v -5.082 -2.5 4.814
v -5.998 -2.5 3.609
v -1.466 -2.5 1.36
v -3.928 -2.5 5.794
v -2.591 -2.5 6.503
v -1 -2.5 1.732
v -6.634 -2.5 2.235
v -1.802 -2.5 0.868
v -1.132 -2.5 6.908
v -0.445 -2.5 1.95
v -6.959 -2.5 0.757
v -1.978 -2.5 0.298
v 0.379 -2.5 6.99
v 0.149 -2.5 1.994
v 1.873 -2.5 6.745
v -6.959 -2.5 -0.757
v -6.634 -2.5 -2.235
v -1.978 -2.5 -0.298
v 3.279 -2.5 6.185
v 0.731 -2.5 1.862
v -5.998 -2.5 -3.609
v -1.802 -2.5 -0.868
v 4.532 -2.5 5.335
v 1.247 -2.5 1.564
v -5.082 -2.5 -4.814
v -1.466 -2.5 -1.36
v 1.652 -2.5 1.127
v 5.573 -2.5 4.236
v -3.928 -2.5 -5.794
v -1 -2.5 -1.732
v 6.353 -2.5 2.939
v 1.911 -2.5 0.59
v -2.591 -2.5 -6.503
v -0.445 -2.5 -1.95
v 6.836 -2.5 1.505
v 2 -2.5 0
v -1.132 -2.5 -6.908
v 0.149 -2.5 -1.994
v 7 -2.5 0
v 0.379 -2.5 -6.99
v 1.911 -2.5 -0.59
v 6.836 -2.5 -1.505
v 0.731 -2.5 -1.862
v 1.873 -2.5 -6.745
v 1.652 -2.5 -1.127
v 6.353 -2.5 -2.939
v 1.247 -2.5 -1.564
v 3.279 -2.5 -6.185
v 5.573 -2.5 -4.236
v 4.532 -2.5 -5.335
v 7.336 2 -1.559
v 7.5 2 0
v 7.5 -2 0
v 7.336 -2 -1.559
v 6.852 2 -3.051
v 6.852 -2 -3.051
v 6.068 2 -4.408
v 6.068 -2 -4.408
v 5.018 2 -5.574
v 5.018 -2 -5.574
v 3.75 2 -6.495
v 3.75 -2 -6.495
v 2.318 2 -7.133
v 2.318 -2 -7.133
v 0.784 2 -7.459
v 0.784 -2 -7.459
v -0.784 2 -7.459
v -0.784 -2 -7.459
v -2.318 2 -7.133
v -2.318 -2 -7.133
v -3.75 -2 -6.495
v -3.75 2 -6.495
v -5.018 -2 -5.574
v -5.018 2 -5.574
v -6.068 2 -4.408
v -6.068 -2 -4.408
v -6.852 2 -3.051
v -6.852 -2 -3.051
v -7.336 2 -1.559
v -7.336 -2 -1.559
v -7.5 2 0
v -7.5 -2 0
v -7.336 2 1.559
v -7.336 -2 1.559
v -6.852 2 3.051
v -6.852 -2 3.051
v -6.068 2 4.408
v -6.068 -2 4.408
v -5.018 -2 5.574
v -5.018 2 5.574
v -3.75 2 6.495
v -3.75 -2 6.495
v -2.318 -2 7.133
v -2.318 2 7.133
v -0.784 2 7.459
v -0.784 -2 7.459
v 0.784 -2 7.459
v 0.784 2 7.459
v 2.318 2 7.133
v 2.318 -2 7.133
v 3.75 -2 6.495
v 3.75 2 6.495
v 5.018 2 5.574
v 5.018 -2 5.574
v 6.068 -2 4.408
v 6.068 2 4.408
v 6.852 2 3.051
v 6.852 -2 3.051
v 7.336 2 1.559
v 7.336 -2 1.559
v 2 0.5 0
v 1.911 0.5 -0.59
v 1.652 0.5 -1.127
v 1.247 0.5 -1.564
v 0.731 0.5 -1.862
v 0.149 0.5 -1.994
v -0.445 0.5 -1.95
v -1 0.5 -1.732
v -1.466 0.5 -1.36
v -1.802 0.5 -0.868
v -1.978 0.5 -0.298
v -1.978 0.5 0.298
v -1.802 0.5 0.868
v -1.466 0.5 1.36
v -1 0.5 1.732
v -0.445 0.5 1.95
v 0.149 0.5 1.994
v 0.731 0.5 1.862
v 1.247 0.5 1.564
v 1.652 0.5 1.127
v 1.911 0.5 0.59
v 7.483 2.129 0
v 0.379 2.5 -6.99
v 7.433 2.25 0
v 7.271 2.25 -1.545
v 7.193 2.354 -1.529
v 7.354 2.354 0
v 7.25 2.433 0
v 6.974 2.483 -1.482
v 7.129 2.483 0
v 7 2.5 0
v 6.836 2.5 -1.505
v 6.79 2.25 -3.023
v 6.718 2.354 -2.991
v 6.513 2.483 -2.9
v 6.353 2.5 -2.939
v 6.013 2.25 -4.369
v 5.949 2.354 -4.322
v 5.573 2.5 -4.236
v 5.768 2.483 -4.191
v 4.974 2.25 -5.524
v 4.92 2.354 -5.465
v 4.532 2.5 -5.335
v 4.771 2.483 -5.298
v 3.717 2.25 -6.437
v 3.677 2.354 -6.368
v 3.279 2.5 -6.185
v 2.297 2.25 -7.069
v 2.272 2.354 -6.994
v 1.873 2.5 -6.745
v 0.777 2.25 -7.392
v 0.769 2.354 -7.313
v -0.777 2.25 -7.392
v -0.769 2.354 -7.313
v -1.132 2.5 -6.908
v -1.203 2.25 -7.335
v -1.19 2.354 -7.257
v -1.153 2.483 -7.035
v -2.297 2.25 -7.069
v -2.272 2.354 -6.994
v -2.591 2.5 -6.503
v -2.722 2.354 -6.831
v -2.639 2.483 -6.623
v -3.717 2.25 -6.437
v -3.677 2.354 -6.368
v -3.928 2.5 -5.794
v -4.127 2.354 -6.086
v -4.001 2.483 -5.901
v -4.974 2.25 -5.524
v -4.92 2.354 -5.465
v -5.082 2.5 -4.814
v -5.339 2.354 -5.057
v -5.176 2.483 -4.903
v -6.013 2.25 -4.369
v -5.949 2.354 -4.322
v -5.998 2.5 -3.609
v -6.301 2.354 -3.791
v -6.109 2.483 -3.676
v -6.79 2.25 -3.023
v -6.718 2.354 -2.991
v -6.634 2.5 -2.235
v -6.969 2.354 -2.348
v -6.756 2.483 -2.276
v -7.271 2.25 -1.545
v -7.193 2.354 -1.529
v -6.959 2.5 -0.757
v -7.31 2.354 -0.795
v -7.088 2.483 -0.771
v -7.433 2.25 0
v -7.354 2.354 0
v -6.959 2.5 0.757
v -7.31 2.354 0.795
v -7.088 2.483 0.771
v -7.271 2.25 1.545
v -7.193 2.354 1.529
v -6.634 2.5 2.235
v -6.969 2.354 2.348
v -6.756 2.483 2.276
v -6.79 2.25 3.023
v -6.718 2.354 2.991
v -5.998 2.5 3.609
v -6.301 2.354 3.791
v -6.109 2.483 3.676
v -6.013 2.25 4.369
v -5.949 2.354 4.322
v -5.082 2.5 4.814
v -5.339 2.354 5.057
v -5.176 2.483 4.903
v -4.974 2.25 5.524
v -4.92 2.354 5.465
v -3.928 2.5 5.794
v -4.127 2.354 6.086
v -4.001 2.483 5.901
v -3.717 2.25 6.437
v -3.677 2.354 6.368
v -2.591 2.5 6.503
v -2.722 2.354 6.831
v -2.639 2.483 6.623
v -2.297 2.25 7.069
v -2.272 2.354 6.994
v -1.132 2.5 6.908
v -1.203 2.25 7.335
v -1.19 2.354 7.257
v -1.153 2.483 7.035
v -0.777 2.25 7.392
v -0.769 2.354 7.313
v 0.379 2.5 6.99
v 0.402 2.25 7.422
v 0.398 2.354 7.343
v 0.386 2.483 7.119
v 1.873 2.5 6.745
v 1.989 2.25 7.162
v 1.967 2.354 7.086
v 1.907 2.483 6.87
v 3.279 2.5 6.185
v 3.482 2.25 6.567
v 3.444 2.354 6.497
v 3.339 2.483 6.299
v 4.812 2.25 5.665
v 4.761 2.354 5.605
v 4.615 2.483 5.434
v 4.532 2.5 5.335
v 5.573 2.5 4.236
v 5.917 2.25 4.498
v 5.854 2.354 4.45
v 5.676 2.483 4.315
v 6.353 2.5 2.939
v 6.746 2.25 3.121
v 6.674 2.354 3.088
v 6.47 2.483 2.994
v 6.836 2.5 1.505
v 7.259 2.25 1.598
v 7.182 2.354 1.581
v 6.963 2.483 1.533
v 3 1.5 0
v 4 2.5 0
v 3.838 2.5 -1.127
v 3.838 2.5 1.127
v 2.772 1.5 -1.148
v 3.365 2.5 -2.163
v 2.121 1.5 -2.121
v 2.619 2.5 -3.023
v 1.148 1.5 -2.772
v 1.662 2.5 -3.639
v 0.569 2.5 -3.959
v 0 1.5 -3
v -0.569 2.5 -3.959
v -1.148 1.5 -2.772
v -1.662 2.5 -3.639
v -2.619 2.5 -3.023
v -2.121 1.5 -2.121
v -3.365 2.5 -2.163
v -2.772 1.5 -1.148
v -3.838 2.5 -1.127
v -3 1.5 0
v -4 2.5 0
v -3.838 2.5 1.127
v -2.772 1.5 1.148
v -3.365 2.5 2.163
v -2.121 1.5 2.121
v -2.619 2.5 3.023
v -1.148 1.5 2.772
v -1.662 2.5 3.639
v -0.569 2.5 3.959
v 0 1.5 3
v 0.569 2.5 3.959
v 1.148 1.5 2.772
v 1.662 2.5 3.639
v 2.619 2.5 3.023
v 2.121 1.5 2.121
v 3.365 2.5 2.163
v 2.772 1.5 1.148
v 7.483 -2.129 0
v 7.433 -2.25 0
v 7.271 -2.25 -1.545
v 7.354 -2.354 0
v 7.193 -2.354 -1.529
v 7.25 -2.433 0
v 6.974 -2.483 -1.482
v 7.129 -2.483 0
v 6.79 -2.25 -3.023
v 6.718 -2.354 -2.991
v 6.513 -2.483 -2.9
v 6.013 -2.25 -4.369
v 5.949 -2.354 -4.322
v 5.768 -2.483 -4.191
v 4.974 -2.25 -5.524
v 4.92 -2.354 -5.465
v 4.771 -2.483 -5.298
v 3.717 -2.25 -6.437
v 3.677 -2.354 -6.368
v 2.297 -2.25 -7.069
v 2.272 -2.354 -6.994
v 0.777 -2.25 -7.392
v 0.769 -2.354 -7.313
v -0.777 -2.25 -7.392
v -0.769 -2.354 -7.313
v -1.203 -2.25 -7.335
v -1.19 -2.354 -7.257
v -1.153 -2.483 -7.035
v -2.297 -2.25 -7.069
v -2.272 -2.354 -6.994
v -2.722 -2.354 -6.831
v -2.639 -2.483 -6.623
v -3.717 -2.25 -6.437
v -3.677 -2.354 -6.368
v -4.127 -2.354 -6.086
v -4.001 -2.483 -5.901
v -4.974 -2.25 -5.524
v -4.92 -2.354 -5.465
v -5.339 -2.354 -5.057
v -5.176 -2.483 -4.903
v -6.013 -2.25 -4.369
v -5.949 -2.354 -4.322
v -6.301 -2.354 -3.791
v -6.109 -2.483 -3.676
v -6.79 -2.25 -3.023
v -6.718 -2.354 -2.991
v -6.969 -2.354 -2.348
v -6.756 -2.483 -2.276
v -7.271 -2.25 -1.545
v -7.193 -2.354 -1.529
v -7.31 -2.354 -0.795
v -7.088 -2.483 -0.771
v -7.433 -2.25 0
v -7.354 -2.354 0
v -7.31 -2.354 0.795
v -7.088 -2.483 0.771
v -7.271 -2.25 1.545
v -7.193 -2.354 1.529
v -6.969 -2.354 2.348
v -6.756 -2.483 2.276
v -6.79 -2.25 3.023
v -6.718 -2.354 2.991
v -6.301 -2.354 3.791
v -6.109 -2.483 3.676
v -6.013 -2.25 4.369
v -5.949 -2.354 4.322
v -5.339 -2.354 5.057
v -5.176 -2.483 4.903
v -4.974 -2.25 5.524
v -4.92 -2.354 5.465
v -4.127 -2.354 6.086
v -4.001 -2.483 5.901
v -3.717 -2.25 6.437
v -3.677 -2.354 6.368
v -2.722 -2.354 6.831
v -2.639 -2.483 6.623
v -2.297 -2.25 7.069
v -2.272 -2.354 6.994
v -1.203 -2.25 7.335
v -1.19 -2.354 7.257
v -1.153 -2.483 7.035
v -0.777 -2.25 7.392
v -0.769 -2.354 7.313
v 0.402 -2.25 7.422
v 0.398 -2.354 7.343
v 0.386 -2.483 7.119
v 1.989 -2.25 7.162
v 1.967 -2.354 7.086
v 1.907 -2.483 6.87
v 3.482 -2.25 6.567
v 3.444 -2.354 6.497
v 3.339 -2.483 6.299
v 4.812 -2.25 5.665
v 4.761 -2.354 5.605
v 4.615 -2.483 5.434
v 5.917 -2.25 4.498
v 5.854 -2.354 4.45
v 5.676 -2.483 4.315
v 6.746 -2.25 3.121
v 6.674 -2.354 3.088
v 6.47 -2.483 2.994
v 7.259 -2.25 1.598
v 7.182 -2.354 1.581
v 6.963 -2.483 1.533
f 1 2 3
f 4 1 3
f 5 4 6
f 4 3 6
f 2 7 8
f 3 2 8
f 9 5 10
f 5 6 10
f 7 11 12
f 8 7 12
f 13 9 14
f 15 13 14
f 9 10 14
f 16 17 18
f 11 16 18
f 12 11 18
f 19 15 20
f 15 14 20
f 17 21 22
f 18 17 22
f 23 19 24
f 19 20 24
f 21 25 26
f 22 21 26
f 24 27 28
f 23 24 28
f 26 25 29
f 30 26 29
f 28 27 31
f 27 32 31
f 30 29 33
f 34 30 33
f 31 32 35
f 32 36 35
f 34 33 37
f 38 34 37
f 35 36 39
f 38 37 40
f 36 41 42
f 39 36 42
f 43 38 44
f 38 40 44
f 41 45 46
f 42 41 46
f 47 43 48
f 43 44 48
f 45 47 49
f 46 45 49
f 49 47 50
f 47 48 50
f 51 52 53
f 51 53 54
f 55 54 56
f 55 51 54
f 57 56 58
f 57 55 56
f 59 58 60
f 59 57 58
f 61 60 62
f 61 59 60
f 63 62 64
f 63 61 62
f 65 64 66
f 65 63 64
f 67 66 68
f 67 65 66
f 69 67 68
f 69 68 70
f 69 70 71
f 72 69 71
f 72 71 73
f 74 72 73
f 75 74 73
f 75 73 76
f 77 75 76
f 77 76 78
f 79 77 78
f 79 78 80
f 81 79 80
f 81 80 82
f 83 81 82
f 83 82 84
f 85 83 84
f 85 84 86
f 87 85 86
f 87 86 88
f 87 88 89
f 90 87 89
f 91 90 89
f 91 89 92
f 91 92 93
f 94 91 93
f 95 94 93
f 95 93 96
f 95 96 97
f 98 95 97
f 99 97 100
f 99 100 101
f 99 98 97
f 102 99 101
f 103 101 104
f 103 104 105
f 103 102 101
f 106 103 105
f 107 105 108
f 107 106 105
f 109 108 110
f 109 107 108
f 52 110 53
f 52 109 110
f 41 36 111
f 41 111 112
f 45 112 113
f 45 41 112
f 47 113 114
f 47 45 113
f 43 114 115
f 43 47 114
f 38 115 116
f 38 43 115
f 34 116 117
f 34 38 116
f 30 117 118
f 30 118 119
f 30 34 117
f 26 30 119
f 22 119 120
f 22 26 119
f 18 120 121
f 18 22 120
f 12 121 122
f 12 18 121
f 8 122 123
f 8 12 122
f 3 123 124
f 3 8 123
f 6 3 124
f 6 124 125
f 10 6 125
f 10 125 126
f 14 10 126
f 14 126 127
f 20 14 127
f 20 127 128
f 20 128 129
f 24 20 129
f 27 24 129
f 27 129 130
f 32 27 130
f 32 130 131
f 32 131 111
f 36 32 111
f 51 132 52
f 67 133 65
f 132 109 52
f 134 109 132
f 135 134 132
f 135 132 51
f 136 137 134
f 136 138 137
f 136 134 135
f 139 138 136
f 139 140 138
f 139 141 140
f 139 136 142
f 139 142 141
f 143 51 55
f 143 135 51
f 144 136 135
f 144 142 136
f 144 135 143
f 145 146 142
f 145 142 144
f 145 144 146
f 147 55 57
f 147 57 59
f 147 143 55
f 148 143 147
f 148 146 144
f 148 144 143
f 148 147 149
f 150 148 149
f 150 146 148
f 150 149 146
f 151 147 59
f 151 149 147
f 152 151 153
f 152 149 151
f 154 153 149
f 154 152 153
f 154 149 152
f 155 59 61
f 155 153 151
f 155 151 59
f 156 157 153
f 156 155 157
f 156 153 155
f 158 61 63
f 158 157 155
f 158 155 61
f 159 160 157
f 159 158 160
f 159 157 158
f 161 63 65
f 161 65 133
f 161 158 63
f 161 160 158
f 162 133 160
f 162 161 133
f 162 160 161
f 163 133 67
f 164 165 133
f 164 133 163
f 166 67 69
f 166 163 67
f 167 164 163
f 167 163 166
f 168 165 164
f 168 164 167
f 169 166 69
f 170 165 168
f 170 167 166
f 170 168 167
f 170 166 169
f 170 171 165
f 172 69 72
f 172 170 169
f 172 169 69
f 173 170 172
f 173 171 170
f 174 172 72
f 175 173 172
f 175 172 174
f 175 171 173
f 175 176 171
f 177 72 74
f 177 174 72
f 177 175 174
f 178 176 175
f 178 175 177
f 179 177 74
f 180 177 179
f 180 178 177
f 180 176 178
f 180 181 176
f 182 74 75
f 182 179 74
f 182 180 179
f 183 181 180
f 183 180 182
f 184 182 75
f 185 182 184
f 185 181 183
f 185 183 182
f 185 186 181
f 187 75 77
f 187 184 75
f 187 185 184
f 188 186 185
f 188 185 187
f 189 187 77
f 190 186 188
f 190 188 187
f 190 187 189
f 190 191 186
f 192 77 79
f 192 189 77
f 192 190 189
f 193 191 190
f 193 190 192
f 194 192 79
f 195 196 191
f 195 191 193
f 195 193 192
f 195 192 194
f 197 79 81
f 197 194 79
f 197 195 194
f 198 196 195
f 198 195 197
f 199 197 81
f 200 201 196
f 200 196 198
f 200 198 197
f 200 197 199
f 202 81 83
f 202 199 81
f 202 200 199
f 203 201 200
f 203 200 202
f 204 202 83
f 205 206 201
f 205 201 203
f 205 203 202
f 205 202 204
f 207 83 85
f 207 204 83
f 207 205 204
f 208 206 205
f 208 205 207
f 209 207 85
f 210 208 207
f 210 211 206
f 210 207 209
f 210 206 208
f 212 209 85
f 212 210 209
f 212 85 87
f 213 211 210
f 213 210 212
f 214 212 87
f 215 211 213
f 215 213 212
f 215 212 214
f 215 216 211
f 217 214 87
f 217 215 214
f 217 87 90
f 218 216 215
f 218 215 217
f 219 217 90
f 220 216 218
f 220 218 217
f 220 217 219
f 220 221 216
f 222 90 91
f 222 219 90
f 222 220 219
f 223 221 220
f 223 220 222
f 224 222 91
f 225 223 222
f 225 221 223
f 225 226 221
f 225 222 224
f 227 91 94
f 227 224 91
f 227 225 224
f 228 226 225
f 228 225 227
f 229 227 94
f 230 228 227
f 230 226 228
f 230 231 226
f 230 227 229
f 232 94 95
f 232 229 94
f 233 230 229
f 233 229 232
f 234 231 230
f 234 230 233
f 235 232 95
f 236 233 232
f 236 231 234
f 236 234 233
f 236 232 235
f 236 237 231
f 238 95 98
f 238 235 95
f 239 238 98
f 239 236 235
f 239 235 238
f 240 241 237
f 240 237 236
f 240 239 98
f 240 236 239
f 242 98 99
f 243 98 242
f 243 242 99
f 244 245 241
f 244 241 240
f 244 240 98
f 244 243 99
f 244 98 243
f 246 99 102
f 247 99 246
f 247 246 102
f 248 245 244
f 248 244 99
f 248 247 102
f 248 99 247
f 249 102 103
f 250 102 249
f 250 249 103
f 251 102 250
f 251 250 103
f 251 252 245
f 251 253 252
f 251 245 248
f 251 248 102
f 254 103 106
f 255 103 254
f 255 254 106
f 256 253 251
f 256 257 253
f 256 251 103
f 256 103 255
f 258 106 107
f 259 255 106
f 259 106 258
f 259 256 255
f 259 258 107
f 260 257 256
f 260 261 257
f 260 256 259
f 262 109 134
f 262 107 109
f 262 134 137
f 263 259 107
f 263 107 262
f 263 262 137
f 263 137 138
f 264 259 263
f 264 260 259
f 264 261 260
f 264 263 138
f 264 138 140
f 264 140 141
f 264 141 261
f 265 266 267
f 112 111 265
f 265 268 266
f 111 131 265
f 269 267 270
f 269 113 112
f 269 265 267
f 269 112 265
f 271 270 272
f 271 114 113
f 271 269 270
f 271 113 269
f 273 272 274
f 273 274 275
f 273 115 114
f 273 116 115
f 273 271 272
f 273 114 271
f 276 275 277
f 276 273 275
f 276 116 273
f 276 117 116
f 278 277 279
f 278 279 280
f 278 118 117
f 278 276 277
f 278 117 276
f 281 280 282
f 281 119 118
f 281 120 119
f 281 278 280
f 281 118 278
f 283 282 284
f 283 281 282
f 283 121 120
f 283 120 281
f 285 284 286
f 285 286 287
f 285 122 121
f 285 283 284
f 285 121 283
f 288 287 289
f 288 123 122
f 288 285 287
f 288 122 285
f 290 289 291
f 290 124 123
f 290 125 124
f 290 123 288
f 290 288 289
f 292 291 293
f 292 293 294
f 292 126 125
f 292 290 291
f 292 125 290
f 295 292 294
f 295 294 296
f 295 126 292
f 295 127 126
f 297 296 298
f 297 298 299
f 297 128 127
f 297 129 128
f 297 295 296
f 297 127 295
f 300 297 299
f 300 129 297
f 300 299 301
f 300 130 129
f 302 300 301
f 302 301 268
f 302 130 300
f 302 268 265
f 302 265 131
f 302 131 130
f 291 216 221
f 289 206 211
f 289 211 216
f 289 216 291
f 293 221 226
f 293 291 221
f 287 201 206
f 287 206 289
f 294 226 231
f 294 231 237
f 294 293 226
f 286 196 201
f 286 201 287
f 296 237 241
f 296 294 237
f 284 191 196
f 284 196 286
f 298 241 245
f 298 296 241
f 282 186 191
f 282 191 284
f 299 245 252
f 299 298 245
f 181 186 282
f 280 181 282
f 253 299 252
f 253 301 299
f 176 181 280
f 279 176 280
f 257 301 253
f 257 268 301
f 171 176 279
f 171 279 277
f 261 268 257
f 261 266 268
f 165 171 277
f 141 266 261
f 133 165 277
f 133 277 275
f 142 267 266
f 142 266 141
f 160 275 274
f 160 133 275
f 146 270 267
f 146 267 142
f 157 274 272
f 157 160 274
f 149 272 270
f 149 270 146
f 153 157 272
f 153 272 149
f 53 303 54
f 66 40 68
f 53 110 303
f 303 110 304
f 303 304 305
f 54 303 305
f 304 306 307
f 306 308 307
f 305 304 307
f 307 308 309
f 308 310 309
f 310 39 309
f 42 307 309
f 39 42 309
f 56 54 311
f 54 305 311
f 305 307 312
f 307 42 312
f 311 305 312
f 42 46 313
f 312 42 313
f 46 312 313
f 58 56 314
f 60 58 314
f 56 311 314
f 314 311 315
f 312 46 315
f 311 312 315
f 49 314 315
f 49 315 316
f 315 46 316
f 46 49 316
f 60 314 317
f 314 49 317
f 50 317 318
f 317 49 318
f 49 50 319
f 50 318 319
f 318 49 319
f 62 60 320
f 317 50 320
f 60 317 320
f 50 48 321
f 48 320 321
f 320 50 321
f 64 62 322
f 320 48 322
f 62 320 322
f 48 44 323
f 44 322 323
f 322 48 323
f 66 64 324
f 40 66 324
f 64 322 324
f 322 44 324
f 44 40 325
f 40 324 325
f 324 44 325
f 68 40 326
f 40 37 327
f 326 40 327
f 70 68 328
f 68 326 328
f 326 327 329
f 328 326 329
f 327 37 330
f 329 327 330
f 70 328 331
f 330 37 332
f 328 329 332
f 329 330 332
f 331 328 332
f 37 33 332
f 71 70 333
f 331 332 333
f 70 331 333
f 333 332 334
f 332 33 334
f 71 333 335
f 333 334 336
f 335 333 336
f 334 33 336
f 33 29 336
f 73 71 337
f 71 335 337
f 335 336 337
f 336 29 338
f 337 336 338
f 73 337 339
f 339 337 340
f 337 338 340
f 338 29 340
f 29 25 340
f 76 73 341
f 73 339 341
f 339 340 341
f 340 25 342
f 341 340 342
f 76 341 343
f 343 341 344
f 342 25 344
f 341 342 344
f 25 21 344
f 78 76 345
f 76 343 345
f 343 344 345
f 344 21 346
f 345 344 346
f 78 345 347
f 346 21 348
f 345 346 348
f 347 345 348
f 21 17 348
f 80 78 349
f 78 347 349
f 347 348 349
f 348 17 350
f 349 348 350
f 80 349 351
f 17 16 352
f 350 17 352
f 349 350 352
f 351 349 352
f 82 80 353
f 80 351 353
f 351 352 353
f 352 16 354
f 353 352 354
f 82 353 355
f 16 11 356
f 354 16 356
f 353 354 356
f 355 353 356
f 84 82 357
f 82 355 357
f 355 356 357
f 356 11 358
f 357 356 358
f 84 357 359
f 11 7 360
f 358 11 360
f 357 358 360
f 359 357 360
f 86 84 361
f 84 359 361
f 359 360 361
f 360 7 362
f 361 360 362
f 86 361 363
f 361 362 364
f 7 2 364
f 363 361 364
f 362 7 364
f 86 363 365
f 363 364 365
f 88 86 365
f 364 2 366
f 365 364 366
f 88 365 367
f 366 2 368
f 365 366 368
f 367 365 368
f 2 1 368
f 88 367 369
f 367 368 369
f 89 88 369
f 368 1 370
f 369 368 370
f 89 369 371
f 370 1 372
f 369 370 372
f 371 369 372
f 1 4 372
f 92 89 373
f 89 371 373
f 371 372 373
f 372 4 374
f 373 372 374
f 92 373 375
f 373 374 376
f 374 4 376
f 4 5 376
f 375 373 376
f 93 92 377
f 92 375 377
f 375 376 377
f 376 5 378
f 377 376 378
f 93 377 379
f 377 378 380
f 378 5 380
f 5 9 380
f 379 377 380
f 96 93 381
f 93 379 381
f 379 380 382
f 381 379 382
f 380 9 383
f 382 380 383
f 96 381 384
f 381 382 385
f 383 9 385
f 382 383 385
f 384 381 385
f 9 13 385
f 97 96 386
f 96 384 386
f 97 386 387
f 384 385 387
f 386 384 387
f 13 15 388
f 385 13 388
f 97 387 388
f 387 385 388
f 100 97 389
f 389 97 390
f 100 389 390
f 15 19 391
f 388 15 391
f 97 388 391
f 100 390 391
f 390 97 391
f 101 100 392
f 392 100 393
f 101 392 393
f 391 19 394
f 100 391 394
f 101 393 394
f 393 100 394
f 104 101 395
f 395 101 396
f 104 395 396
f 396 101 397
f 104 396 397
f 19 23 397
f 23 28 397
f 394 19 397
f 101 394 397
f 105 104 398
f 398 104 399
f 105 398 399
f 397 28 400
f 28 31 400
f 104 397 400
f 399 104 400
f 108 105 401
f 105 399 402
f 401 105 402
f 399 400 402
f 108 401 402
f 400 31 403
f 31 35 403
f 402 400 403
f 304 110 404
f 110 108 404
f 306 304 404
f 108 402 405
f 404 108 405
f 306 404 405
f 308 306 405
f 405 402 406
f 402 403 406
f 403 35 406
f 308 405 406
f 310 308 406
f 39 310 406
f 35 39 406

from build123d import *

# Parameters (mm, degrees)
SKETCH1_R           = 7.5
SKETCH1_R_2         = 2
BOSS_EXTRUDE1_DEPTH = 2.5
FILLET1_R           = 0.5
CHAMFER1_SIZE       = 2


with BuildPart() as part:
    # Sketch1 → Boss-Extrude1 (new body, symmetric)
    with BuildSketch(Plane(origin=(0, 0, 0), x_dir=(1, 0, 0), z_dir=(0, 1, 0))):
        Circle(SKETCH1_R)
        Circle(SKETCH1_R_2, mode=Mode.SUBTRACT)
    extrude(amount=BOSS_EXTRUDE1_DEPTH, both=True)

    # Fillet1
    fillet1_edges = [part.edges().sort_by_distance(p)[0] for p in [
        (-7.5, -2.5, 0),
        (-7.5, 2.5, 0),
    ]]
    fillet(fillet1_edges, radius=FILLET1_R)

    # Chamfer1
    chamfer1_edges = [part.edges().sort_by_distance(p)[0] for p in [
        (-2, 2.5, 0),
    ]]
    chamfer(chamfer1_edges, length=CHAMFER1_SIZE)


solid = part.part
